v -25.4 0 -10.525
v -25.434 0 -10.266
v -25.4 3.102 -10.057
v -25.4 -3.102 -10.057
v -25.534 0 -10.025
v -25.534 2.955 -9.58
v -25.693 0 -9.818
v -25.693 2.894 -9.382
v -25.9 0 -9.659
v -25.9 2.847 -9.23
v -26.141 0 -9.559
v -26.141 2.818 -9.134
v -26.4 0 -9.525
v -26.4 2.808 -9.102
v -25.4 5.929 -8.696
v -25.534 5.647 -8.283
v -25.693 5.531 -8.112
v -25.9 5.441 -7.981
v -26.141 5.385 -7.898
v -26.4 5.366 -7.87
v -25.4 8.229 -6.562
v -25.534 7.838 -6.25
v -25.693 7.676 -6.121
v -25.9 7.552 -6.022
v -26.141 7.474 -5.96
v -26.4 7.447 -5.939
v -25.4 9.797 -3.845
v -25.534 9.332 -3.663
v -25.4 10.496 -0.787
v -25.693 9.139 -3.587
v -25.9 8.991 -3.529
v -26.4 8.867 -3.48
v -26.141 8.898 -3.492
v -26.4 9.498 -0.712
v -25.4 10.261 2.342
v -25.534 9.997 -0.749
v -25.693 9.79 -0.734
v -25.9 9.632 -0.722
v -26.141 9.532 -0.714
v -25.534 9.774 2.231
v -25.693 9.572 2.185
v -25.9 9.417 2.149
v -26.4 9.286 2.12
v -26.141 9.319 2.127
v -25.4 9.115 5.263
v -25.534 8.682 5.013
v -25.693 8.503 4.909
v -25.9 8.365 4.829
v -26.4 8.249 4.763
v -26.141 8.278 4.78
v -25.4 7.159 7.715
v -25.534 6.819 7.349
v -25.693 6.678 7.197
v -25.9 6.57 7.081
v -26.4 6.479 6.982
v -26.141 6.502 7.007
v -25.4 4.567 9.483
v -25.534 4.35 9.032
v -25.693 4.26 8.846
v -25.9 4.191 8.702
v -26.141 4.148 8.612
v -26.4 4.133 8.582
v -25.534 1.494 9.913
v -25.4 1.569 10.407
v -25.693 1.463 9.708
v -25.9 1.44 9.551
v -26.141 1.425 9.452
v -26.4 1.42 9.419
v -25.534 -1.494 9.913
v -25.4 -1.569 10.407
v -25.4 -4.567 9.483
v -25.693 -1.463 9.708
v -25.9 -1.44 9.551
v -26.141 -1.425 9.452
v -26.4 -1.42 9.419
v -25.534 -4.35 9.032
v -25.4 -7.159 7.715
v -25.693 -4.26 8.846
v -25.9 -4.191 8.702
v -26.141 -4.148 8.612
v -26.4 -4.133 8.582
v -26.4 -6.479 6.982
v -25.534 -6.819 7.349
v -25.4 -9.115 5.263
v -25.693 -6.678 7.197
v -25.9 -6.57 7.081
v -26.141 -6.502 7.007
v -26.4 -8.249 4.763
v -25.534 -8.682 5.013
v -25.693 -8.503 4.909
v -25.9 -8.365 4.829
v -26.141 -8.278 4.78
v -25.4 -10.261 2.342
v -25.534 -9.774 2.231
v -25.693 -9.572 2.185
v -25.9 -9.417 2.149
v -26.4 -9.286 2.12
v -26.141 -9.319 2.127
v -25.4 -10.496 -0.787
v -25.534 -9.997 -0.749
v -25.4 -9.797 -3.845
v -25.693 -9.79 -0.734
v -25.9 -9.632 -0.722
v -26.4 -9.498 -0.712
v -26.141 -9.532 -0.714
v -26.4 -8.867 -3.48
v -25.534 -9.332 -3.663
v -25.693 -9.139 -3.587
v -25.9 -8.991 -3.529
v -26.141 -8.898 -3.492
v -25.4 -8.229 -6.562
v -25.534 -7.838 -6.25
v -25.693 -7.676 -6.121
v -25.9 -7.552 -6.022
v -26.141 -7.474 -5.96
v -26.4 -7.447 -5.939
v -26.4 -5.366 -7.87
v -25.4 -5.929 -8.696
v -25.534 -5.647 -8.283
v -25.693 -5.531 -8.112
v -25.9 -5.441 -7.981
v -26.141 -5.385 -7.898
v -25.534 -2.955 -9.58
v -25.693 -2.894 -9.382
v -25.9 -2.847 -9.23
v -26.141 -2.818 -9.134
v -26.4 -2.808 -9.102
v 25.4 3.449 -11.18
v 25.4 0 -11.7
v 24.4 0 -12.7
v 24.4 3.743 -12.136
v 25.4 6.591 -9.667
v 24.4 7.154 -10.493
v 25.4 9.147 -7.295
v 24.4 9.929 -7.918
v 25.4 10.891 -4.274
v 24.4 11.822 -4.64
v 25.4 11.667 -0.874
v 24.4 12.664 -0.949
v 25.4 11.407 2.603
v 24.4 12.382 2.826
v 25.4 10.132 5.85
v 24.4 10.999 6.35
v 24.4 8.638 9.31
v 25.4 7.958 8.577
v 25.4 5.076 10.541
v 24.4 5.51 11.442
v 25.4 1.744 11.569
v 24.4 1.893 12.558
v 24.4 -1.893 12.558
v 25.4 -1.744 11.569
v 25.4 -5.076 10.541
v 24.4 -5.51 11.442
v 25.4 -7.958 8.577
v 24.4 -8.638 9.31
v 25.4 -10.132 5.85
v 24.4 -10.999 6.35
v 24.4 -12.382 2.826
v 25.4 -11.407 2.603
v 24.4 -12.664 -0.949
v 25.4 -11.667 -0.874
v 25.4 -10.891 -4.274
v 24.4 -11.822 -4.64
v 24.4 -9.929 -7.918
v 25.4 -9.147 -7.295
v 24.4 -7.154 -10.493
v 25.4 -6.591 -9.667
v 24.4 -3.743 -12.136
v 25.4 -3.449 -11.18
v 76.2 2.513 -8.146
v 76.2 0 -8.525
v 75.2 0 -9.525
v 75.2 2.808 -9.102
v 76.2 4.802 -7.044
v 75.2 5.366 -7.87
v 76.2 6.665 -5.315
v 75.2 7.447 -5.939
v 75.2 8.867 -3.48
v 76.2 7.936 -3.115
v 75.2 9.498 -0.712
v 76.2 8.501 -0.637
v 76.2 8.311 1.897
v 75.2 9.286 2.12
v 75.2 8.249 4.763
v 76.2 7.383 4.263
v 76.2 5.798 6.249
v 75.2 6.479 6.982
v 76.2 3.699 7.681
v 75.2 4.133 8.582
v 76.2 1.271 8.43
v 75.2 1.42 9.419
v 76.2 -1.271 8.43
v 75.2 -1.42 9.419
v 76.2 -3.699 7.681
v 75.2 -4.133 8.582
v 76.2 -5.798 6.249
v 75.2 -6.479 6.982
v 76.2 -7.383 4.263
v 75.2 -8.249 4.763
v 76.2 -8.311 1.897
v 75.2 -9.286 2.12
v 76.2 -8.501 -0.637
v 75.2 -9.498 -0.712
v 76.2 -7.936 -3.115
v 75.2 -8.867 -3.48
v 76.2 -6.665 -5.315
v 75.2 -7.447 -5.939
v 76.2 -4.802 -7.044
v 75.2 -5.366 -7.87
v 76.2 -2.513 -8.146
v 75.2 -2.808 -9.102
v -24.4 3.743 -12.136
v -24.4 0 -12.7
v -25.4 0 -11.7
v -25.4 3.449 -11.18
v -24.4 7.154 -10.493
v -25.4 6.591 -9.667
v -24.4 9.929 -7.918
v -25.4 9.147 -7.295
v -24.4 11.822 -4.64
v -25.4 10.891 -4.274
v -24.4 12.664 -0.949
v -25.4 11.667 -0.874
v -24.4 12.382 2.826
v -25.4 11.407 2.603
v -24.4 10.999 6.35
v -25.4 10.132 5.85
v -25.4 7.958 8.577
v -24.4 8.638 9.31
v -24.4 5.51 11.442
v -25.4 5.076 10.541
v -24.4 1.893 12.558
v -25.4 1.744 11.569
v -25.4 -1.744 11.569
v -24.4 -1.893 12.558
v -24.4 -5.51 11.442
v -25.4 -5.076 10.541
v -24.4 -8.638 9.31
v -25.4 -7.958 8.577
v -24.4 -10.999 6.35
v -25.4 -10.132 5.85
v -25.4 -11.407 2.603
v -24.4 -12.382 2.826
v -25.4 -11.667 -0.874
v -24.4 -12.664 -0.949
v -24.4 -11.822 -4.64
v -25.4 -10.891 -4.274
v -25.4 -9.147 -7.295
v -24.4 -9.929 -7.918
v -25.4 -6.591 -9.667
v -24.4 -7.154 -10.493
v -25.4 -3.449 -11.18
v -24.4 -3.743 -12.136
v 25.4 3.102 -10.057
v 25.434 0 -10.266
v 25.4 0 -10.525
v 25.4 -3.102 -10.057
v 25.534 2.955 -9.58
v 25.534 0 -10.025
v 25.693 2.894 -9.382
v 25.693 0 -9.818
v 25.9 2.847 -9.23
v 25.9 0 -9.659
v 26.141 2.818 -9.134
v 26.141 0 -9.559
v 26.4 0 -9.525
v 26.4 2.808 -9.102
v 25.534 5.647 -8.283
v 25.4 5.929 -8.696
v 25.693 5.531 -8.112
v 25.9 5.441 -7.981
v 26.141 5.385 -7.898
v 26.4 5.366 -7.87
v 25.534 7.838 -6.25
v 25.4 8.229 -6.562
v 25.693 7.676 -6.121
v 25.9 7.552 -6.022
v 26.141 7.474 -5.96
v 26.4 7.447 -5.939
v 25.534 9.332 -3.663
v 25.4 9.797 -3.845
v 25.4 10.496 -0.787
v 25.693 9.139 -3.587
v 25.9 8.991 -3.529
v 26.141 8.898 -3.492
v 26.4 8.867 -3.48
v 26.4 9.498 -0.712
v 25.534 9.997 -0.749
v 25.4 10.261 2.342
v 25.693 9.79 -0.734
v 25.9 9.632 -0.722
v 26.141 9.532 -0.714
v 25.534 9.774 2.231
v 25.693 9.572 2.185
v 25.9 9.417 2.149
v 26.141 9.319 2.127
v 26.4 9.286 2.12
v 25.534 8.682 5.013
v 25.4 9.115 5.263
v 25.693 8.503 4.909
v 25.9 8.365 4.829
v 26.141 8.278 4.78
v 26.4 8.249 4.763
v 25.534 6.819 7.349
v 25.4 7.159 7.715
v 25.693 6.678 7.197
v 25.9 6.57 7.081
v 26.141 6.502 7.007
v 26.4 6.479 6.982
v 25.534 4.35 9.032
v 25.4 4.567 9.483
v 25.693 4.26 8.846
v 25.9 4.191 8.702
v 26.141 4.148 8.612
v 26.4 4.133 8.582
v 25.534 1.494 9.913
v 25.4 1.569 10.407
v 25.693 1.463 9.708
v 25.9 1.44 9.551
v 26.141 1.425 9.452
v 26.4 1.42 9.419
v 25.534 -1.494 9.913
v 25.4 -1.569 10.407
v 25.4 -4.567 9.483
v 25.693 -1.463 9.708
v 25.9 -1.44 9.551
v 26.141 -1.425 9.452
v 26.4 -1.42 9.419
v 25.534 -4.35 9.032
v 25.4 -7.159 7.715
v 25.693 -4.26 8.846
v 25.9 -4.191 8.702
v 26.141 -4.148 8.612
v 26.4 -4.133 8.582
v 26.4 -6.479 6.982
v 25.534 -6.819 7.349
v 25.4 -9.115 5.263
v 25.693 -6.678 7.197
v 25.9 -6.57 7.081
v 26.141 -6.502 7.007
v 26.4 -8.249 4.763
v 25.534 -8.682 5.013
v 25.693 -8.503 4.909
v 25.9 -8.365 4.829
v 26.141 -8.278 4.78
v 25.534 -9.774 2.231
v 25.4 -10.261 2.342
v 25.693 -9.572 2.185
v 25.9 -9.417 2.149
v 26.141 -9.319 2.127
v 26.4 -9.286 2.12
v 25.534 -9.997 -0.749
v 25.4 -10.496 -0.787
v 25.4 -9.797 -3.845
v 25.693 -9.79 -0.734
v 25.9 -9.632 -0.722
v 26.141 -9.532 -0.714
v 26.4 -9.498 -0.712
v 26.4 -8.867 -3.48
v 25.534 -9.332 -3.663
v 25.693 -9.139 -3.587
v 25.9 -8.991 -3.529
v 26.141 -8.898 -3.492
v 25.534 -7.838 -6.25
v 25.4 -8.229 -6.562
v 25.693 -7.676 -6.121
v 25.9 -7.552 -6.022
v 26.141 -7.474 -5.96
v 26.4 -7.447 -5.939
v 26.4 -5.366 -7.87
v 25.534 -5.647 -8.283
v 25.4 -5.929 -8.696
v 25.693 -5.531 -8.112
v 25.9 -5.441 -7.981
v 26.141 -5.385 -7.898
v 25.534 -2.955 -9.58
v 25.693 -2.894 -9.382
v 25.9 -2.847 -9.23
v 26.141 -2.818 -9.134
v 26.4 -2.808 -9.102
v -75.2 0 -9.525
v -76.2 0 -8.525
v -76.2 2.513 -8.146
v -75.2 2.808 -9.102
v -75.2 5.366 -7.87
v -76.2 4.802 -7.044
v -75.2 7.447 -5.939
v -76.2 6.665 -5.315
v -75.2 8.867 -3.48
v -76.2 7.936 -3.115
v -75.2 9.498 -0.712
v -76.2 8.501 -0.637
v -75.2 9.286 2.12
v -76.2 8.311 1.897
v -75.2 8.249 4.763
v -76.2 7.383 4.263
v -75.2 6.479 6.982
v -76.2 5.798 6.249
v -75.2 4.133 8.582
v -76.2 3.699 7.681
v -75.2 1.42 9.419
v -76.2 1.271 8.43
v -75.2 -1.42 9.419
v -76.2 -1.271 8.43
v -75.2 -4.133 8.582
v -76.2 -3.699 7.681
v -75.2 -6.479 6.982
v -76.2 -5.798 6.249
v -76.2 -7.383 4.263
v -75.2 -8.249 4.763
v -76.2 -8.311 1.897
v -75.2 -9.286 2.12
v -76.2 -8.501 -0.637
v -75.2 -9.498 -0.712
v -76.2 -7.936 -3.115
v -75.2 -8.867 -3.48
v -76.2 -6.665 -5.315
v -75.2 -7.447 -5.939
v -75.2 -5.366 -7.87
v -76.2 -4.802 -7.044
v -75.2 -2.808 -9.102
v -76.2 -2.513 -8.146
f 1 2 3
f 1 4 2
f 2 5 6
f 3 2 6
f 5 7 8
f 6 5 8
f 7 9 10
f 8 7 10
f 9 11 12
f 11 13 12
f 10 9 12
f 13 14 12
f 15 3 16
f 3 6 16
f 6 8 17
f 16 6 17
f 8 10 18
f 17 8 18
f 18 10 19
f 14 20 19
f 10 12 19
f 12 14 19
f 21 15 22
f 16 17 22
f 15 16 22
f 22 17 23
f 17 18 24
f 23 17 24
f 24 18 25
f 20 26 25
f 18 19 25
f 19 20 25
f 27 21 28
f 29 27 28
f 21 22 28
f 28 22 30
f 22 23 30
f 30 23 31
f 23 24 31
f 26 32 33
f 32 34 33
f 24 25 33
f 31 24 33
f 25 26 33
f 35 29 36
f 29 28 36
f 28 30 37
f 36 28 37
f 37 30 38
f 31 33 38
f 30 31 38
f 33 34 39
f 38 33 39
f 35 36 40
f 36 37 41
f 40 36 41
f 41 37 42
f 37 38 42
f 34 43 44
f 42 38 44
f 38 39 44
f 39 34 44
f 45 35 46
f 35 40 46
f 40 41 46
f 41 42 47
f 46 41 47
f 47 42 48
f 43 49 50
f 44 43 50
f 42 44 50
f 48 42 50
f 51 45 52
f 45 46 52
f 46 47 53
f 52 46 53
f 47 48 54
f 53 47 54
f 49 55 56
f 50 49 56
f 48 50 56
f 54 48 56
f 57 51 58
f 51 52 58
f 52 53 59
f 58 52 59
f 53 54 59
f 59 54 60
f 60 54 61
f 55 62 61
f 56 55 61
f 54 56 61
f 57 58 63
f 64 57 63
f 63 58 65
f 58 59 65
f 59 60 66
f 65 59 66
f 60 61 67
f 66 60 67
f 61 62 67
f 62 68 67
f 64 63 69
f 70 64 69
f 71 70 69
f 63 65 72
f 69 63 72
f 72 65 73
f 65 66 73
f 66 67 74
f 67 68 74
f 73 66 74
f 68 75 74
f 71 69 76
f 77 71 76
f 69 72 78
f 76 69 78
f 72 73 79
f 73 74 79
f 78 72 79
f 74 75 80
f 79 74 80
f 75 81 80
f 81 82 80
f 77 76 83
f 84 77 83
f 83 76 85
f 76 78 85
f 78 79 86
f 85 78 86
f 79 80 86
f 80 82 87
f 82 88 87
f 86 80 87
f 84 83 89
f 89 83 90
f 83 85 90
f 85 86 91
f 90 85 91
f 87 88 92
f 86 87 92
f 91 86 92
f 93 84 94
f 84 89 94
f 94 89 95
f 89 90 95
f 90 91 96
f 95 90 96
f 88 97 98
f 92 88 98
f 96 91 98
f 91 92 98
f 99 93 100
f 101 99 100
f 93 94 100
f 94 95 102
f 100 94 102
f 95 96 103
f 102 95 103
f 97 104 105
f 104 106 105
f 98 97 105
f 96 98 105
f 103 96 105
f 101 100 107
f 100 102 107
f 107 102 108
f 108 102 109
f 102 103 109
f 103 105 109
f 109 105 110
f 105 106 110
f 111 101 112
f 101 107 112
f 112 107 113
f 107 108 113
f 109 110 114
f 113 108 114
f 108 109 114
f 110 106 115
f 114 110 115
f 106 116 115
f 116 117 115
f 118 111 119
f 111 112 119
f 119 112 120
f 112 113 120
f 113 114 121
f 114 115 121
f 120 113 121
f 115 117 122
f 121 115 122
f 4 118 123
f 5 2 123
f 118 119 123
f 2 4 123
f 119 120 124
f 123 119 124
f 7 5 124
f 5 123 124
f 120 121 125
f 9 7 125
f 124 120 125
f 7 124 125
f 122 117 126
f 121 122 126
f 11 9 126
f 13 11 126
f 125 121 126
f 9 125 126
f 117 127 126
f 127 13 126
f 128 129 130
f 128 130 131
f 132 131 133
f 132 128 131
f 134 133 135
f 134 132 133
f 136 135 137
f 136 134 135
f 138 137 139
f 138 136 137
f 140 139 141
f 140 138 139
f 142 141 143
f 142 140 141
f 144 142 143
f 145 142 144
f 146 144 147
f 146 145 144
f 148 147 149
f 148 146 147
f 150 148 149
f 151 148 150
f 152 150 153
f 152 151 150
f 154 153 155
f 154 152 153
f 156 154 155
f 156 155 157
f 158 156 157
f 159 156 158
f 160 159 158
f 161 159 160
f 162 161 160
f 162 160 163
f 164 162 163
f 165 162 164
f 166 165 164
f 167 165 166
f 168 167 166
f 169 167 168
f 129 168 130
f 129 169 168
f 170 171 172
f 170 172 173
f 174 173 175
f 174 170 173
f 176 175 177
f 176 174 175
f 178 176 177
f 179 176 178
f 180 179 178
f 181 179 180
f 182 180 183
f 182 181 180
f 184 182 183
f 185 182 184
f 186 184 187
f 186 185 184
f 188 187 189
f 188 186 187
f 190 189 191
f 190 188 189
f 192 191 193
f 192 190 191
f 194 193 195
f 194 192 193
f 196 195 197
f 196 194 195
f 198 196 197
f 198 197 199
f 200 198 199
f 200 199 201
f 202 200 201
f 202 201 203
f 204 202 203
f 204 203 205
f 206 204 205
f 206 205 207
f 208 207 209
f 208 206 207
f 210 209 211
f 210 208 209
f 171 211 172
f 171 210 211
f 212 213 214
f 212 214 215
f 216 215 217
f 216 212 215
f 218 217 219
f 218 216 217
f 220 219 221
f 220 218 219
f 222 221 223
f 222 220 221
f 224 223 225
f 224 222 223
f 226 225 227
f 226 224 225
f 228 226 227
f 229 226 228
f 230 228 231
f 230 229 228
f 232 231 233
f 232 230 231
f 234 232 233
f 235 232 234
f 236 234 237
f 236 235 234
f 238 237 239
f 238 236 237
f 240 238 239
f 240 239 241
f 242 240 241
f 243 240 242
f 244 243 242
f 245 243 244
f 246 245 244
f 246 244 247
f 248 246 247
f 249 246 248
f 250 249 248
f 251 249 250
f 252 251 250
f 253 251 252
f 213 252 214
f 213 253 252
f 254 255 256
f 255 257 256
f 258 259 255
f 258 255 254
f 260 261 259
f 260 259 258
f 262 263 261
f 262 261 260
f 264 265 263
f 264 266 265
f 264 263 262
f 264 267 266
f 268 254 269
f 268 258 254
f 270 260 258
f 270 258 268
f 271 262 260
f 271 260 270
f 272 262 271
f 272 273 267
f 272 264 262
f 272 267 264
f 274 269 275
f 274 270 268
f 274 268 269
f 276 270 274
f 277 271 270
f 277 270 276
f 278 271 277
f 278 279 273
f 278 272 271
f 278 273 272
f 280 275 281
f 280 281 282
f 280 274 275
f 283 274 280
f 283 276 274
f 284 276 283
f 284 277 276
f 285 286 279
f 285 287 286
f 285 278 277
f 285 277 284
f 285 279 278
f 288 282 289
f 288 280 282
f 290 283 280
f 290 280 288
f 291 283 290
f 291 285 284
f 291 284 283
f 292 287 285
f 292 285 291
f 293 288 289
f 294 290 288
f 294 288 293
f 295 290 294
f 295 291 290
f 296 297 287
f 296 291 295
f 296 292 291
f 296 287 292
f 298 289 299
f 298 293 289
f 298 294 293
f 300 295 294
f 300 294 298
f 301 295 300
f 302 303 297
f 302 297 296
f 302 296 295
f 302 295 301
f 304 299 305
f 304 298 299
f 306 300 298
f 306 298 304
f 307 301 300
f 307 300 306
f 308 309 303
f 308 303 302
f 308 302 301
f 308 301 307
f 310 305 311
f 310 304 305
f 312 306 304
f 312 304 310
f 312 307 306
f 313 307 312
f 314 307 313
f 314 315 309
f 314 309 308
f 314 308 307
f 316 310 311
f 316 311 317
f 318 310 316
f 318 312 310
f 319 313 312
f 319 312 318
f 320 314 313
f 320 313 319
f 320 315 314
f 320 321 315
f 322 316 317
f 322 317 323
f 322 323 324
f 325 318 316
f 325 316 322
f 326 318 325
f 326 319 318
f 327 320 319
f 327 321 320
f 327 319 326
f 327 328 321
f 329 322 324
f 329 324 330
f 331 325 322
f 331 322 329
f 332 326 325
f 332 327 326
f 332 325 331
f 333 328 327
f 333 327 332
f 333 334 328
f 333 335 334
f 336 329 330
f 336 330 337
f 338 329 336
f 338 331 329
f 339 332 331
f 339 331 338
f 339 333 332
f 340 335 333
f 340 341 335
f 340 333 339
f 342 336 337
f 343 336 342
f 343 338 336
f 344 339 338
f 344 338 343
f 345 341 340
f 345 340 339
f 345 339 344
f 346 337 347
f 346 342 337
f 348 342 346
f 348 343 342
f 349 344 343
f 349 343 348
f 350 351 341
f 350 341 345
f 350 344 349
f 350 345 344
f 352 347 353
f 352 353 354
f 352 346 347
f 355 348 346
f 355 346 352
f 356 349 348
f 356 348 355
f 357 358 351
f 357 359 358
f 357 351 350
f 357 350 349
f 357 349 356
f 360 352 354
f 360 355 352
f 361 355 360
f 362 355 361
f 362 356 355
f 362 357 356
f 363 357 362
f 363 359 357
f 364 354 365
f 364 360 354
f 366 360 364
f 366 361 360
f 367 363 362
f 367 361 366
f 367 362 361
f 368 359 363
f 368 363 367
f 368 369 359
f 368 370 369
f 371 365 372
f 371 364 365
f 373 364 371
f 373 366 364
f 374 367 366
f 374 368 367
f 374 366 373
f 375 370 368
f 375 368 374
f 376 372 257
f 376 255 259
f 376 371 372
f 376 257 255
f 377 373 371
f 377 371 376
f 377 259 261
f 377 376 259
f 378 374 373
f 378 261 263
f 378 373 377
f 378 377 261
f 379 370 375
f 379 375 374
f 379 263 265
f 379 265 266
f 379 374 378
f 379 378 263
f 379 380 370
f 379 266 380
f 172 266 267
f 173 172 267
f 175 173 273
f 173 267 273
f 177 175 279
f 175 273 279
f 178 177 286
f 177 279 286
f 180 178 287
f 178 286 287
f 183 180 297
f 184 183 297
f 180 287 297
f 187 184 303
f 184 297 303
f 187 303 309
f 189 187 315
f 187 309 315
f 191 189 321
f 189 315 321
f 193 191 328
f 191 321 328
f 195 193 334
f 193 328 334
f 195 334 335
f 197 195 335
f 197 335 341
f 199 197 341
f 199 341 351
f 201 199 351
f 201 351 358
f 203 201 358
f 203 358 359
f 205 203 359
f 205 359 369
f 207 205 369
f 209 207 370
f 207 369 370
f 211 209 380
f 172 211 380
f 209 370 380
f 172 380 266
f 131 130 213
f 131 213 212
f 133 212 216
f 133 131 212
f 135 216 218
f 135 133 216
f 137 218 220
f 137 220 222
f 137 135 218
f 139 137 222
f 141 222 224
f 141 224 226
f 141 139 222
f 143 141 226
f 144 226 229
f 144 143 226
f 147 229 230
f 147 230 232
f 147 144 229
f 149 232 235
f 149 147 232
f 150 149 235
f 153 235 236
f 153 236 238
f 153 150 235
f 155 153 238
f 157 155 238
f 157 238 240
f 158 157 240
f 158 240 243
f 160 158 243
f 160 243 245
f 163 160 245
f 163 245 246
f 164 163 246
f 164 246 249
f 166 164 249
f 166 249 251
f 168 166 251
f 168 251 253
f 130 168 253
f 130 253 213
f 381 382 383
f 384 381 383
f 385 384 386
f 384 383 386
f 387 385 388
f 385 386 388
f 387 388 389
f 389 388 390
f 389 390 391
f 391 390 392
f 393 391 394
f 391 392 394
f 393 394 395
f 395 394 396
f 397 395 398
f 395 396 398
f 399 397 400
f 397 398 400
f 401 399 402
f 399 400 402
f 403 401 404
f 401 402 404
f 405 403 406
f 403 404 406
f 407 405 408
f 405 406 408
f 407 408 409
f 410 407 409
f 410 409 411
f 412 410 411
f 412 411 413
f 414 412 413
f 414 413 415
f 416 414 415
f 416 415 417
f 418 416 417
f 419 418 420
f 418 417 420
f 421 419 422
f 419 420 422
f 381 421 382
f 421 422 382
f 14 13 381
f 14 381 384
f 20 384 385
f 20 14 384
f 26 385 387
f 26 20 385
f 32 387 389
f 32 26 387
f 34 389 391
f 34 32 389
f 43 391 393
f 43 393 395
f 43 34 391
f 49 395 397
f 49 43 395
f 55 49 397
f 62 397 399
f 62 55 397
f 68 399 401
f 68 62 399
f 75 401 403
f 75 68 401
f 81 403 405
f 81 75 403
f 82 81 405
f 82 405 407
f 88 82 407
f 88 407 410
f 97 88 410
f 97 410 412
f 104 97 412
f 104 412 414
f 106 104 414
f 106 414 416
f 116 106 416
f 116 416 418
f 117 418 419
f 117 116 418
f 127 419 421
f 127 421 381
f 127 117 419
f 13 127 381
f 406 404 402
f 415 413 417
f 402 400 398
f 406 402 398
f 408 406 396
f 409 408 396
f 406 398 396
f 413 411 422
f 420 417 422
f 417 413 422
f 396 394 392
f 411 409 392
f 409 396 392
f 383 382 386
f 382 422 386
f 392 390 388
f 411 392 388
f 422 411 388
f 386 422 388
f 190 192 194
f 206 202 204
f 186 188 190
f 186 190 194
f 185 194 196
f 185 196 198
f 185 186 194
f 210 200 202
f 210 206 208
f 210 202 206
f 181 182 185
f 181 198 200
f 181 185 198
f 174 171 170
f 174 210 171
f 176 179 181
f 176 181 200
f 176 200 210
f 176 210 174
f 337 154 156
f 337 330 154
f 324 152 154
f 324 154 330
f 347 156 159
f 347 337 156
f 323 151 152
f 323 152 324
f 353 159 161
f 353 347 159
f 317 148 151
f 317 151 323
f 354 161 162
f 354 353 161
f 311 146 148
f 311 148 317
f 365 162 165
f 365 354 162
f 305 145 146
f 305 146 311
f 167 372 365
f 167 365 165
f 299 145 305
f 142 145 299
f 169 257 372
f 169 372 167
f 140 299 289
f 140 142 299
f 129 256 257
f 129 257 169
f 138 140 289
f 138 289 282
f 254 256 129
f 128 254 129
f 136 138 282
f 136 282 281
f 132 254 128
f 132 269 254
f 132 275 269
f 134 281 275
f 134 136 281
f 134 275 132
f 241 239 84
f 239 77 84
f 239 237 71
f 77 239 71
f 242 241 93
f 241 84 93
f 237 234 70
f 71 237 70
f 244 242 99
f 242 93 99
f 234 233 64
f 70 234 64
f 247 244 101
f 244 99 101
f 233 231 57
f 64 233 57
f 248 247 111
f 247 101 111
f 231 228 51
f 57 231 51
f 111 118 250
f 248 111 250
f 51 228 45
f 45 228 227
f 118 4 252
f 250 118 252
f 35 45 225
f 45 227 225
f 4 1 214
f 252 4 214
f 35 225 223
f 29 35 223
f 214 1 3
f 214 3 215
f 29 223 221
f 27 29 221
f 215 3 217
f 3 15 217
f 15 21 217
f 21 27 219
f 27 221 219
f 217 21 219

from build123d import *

# Parameters (mm, degrees)
CROQUIS1_R              = 12.7
SALIENTE_EXTRUIR1_DEPTH = 25.4
CROQUIS2_R              = 9.525
SALIENTE_EXTRUIR2_DEPTH = 50.8
REDONDEO1_R             = 1
REDONDEO2_R             = 1
CHAFL_N1_SIZE           = 1
CHAFL_N2_SIZE           = 1


with BuildPart() as part:
    # Croquis1 → Saliente-Extruir1 (new body, symmetric)
    with BuildSketch(Plane(origin=(0, 0, 0), x_dir=(0, 0, -1), z_dir=(1, 0, 0))):
        Circle(CROQUIS1_R)
    extrude(amount=SALIENTE_EXTRUIR1_DEPTH, both=True)

    # Croquis2 → Saliente-Extruir2 (add)
    with BuildSketch(Plane(origin=(25.4, 0, 0), x_dir=(0, 0, -1), z_dir=(1, 0, 0))):
        Circle(CROQUIS2_R)
    saliente_extruir2 = extrude(amount=SALIENTE_EXTRUIR2_DEPTH)

    # Redondeo1
    redondeo1_edges = [part.edges().sort_by_distance(p)[0] for p in [
        (25.4, 0, 9.525),
    ]]
    fillet(redondeo1_edges, radius=REDONDEO1_R)

    # Simetría3: Saliente-Extruir2 across plane
    add(saliente_extruir2.mirror(Plane(origin=(0, 0, 0), x_dir=(0, 0, 1), z_dir=(1, 0, 0))))

    # Redondeo2
    redondeo2_edges = [part.edges().sort_by_distance(p)[0] for p in [
        (-25.4, 0, 9.525),
    ]]
    fillet(redondeo2_edges, radius=REDONDEO2_R)

    # Chaflán1
    chafl_n1_edges = [part.edges().sort_by_distance(p)[0] for p in [
        (-76.2, 0, 9.525),
        (76.2, 0, 9.525),
    ]]
    chamfer(chafl_n1_edges, length=CHAFL_N1_SIZE)

    # Chaflán2
    chafl_n2_edges = [part.edges().sort_by_distance(p)[0] for p in [
        (-25.4, 0, 12.7),
        (25.4, 0, 12.7),
    ]]
    chamfer(chafl_n2_edges, length=CHAFL_N2_SIZE)


solid = part.part
